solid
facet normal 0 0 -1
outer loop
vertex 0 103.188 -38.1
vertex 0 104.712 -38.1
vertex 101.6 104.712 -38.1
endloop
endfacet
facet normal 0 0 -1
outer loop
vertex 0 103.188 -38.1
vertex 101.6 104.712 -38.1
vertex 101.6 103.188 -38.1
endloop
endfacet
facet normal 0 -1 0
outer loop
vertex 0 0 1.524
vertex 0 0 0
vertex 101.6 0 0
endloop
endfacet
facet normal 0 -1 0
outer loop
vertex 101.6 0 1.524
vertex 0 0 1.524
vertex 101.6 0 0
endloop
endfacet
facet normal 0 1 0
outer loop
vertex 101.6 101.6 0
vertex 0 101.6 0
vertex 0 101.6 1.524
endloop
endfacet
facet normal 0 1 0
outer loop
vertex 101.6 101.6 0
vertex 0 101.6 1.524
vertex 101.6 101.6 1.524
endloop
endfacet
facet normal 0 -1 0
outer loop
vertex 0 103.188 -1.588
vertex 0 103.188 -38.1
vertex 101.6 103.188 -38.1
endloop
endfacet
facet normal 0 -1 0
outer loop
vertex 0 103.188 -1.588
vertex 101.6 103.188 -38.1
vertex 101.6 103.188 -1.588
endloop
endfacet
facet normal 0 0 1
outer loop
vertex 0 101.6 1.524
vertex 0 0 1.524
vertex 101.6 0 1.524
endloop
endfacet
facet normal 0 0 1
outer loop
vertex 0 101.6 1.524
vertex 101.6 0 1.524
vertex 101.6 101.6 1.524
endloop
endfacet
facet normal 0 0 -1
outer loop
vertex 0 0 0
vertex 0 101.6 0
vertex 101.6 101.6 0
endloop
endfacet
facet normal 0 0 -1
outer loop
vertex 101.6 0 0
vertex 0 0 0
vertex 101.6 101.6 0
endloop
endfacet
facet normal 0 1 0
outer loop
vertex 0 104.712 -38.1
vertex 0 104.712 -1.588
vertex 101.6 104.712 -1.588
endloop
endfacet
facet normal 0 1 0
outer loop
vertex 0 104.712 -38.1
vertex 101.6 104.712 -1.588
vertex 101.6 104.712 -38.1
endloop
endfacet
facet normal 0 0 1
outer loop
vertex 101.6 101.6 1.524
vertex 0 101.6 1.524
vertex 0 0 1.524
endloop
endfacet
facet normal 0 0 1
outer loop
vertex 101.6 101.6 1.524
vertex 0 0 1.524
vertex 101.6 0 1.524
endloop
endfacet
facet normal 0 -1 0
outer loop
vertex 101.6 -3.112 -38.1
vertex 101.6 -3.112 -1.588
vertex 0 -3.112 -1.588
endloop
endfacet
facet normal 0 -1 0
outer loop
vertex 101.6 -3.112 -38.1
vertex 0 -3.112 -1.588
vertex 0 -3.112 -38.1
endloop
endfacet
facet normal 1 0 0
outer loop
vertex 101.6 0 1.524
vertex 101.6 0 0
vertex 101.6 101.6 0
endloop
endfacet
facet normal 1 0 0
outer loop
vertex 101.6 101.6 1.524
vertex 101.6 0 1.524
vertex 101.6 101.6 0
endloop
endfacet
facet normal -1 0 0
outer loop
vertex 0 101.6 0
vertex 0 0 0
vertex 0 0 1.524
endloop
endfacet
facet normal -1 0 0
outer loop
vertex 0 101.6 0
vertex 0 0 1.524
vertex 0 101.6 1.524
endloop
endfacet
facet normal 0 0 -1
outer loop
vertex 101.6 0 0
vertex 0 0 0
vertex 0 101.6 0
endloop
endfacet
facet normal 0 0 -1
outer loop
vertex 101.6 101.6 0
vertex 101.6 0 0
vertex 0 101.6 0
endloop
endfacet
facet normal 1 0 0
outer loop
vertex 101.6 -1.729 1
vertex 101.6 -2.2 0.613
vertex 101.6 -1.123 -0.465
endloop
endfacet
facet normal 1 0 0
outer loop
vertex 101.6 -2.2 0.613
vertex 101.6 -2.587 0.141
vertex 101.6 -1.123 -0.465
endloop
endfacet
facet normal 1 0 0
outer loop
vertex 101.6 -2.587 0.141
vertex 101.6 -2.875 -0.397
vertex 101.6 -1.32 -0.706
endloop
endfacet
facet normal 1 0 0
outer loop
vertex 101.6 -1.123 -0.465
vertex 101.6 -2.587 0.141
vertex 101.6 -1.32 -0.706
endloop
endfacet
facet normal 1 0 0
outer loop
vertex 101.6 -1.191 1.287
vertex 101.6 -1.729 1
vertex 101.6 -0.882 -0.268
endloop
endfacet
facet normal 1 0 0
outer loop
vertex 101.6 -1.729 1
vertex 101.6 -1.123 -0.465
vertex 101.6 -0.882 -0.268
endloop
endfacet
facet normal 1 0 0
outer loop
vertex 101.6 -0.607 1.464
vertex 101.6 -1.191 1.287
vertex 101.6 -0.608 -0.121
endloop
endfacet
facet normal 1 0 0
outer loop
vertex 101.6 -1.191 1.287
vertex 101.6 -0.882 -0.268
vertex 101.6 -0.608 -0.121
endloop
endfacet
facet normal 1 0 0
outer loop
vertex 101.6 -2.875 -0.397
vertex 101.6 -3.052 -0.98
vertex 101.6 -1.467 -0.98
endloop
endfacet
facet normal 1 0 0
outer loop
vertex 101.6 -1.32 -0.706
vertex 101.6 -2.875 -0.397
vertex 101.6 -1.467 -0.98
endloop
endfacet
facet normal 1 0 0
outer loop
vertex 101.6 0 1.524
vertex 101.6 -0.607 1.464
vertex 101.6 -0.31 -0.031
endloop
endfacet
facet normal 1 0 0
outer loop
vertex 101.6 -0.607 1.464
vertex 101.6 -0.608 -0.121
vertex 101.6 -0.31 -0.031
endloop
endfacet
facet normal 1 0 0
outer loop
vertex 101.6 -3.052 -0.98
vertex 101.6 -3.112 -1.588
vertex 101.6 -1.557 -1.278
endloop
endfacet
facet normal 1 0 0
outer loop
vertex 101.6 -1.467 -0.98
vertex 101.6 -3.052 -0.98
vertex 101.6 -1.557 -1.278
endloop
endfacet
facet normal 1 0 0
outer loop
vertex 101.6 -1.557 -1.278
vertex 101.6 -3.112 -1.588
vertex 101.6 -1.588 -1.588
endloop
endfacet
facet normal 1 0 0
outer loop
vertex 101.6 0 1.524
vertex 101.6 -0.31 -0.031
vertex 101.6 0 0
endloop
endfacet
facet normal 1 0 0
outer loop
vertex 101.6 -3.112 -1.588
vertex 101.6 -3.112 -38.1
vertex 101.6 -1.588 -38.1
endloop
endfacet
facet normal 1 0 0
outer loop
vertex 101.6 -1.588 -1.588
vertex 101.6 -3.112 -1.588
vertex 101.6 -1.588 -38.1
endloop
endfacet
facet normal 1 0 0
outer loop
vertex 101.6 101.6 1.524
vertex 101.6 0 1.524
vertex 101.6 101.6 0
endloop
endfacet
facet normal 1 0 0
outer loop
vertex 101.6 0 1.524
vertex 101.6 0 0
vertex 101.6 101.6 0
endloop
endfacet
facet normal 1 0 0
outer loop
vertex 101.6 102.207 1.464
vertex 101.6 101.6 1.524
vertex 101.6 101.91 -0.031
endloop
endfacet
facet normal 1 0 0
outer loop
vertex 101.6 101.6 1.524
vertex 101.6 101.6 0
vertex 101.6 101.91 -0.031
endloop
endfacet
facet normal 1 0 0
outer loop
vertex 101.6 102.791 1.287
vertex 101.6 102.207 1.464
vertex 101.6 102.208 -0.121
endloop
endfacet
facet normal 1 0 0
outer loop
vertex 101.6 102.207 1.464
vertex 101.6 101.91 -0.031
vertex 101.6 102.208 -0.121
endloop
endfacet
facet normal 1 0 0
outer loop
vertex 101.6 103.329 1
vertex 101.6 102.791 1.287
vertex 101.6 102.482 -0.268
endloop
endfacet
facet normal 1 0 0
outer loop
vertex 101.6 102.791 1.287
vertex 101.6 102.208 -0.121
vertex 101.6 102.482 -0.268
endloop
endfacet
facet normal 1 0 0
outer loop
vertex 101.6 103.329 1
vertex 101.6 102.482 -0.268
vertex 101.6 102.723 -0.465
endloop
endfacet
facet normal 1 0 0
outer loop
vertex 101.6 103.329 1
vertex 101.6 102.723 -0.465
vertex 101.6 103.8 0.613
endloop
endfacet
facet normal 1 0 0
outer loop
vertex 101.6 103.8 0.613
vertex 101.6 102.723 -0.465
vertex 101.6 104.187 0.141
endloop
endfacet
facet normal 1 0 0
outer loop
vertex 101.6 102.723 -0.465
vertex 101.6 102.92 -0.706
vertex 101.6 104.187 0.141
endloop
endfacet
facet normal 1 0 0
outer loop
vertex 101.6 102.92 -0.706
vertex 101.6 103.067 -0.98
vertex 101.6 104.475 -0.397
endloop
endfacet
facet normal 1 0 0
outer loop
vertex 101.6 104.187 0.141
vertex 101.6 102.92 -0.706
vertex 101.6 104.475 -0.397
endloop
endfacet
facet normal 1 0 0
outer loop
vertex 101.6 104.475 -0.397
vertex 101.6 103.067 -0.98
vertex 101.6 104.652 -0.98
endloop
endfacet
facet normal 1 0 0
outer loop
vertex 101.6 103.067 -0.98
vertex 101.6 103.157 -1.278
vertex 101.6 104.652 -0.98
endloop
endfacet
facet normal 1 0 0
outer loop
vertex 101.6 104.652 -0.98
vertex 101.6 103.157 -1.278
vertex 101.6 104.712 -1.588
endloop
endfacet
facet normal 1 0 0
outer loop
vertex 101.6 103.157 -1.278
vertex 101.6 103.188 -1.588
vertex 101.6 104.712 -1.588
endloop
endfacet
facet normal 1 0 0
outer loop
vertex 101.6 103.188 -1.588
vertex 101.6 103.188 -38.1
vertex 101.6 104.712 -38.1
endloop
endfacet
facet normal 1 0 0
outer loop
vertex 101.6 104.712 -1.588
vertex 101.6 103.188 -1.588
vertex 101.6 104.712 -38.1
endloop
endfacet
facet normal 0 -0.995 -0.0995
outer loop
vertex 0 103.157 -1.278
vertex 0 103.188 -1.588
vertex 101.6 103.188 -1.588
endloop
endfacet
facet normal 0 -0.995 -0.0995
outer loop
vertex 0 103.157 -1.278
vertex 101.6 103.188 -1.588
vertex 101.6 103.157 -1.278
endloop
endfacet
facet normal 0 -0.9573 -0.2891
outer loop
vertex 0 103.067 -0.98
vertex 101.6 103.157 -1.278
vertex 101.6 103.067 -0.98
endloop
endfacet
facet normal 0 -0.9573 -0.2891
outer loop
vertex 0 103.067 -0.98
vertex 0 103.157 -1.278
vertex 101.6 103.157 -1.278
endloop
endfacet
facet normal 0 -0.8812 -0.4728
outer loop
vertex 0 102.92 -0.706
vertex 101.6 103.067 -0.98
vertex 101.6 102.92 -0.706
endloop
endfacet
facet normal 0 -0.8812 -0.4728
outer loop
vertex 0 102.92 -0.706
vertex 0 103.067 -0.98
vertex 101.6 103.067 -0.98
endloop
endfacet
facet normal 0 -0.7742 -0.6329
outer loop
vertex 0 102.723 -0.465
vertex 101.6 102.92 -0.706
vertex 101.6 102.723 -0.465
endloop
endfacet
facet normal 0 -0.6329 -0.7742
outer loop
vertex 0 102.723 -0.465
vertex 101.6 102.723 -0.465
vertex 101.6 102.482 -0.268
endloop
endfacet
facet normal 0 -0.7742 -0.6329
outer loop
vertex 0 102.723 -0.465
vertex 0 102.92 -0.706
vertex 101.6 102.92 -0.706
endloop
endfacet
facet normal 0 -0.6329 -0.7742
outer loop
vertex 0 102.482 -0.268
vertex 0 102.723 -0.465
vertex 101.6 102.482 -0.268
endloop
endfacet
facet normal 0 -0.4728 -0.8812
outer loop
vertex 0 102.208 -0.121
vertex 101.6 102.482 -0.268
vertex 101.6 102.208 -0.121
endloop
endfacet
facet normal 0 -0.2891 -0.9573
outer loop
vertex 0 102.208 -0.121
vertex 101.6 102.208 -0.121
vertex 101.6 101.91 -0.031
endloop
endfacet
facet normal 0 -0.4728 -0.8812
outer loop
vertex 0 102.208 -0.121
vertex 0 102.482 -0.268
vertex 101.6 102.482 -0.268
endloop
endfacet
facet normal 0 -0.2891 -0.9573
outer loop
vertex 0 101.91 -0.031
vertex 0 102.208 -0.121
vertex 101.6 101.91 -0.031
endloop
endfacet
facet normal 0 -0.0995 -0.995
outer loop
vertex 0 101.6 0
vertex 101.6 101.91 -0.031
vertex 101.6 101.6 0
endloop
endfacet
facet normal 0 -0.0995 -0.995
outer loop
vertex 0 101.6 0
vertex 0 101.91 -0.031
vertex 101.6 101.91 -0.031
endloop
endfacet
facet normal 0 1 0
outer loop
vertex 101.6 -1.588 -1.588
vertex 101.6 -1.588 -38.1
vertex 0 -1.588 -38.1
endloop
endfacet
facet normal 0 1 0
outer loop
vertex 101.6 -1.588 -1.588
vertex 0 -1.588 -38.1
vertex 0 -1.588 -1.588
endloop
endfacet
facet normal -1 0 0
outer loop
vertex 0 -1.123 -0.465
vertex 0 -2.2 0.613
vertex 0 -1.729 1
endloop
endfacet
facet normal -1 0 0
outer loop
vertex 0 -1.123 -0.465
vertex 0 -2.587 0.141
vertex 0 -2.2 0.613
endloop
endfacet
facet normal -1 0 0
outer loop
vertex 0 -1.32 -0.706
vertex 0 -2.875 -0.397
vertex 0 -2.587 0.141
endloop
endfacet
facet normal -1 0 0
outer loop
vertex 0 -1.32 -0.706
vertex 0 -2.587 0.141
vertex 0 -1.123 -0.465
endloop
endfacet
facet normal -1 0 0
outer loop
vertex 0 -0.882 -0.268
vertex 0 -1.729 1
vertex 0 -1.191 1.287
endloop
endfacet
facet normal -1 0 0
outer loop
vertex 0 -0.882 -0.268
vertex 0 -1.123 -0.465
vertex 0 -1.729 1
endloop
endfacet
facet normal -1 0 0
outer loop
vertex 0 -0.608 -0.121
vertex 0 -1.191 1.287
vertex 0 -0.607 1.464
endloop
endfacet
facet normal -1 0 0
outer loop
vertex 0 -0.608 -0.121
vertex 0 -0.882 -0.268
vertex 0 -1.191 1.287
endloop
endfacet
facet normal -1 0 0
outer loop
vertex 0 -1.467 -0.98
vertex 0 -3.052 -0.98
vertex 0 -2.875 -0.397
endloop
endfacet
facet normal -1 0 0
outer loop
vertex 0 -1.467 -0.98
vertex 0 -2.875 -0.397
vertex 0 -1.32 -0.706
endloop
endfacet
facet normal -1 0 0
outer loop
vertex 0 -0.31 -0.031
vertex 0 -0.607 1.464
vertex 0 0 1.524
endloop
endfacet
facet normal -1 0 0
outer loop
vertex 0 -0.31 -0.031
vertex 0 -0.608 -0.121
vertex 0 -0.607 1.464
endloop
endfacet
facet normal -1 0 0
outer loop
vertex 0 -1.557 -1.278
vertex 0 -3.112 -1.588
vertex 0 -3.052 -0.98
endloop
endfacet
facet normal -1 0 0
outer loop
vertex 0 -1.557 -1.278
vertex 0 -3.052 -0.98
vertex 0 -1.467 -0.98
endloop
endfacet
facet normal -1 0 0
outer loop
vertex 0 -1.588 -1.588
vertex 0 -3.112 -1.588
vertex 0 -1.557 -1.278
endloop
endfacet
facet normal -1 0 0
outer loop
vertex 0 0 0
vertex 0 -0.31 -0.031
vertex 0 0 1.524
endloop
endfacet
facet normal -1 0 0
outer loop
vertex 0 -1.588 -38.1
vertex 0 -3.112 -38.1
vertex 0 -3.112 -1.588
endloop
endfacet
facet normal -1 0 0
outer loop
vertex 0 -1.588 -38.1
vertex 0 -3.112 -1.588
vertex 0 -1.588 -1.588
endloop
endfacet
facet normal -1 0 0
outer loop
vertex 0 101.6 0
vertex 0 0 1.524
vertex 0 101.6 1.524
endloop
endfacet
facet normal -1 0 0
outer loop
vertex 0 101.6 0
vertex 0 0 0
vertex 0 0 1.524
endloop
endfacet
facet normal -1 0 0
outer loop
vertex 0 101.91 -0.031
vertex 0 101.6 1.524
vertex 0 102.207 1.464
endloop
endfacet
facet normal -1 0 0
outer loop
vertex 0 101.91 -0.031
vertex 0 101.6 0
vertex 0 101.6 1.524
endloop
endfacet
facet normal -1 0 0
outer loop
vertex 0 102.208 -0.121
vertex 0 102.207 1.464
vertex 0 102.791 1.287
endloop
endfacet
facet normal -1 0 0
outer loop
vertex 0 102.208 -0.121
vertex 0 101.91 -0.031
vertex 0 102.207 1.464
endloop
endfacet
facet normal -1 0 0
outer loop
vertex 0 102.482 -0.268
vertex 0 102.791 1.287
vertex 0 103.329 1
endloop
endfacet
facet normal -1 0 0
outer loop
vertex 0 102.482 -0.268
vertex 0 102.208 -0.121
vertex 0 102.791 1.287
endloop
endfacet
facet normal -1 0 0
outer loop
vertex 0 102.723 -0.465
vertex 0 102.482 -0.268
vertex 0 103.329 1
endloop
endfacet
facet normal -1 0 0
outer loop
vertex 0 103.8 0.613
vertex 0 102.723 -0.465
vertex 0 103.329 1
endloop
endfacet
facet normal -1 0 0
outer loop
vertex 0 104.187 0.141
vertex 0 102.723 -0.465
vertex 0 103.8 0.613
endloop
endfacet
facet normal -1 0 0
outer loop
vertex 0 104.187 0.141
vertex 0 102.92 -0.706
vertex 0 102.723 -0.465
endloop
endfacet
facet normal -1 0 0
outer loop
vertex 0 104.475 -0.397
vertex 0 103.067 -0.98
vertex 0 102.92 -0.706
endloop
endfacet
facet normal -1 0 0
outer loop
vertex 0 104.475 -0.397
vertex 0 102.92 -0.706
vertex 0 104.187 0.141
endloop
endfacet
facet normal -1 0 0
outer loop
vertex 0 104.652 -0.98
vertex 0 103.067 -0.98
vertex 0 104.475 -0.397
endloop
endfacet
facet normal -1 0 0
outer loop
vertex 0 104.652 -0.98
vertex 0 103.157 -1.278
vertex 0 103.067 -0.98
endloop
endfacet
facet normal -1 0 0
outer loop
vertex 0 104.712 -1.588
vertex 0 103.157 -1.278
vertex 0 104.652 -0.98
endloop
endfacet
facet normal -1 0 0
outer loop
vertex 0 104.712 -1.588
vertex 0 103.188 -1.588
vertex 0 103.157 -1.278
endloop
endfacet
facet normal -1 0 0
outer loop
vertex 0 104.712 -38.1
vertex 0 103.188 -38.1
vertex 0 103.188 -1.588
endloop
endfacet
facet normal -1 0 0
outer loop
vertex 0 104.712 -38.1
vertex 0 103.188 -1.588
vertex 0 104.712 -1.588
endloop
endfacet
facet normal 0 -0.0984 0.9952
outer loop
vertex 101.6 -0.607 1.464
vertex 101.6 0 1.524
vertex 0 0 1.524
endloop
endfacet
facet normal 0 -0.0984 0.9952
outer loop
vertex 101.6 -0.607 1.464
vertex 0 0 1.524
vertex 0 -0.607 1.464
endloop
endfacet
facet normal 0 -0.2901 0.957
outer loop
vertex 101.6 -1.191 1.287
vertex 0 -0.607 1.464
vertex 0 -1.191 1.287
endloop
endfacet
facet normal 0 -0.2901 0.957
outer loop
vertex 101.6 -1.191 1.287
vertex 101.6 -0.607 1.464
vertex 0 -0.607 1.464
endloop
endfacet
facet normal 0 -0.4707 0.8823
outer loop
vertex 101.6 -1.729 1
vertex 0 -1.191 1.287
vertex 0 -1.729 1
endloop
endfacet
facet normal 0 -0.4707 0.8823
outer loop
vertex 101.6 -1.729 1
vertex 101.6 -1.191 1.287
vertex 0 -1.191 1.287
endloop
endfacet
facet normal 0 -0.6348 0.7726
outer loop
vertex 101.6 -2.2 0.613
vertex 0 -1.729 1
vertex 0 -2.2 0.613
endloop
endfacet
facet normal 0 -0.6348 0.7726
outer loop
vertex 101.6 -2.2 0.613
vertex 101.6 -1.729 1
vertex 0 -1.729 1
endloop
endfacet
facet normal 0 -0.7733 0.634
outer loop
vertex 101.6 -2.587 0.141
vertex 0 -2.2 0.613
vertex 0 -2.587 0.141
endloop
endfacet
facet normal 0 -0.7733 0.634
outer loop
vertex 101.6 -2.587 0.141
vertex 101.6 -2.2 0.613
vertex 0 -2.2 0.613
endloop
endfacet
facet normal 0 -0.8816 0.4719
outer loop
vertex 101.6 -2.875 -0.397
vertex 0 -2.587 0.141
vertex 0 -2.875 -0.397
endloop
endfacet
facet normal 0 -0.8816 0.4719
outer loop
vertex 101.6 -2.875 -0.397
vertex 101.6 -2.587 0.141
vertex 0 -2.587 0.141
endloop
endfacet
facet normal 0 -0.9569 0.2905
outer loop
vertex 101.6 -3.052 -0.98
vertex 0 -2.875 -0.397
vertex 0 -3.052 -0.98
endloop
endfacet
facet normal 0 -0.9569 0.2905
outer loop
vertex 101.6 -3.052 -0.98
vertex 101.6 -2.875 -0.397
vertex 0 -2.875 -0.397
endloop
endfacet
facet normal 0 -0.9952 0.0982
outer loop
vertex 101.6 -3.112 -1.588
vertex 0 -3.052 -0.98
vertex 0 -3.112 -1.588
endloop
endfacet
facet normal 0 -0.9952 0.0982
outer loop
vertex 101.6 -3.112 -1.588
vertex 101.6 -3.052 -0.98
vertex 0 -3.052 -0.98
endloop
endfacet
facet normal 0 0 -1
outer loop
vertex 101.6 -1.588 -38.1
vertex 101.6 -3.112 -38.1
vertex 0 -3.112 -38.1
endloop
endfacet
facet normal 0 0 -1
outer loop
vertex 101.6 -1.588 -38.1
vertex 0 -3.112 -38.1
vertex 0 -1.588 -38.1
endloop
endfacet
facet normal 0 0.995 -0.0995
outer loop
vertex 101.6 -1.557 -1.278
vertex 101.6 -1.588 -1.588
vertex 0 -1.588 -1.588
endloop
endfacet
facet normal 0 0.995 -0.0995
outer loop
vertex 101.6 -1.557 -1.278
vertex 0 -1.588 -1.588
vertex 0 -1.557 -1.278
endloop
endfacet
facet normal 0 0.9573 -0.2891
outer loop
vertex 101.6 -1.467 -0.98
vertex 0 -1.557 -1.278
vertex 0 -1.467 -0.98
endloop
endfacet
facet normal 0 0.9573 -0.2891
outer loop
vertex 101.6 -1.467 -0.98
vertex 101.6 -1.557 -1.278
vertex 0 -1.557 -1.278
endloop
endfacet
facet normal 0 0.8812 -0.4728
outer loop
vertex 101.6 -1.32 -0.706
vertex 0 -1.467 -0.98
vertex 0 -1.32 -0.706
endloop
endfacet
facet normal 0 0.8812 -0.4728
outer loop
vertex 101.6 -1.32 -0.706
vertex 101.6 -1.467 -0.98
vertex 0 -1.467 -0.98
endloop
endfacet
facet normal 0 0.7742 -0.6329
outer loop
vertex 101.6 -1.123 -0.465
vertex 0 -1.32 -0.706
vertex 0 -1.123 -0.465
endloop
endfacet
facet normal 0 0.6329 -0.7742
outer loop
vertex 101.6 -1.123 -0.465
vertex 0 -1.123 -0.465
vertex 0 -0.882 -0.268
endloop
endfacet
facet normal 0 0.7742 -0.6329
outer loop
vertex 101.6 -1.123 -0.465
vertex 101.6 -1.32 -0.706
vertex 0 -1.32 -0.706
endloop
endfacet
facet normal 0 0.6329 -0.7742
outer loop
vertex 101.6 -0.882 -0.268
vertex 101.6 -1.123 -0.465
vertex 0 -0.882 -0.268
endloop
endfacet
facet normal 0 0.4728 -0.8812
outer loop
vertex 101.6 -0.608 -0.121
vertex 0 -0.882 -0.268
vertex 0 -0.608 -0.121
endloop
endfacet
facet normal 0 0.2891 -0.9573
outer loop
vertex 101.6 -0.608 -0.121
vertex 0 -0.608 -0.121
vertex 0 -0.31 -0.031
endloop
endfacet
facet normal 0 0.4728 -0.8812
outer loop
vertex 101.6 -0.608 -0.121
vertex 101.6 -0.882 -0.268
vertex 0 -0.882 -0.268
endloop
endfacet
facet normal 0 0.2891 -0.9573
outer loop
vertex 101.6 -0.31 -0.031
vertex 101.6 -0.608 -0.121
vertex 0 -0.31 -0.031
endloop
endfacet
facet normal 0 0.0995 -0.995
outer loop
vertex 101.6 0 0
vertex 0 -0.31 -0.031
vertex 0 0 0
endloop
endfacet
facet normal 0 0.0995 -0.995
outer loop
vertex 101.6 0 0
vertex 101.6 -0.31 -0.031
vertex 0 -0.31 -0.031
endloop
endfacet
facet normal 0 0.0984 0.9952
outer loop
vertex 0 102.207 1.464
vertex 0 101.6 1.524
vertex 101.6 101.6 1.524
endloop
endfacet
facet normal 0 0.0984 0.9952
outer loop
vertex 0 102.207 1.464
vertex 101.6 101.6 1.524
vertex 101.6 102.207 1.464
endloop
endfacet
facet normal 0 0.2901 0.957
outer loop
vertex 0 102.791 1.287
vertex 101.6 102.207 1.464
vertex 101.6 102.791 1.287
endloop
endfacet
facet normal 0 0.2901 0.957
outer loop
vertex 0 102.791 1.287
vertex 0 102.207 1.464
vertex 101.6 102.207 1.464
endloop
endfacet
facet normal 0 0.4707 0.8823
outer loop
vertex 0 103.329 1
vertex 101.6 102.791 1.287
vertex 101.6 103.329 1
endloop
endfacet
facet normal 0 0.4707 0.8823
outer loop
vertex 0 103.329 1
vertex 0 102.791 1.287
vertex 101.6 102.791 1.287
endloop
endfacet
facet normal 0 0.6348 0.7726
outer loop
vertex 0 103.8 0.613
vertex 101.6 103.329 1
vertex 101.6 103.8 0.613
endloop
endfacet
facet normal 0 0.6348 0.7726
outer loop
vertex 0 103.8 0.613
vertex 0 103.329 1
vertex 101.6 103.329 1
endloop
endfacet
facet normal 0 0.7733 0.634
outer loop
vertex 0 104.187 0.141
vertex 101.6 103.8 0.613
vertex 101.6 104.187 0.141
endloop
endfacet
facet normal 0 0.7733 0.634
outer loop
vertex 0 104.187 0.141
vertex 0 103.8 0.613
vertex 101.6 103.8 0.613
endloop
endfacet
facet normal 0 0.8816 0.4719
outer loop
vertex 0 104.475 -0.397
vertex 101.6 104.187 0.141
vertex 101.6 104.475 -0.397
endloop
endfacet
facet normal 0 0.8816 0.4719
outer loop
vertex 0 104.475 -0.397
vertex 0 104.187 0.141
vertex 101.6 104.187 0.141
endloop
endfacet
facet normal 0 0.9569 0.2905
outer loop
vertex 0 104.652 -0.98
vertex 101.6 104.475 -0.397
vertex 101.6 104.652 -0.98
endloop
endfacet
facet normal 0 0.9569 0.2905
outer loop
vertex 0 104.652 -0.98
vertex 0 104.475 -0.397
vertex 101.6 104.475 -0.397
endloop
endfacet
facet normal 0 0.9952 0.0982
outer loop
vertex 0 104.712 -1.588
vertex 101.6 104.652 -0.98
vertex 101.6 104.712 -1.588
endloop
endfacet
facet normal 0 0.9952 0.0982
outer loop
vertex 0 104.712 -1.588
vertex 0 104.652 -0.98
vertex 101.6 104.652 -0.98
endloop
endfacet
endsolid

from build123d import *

# Parameters (mm, degrees)
ESQUISSE1_W                 = 101.6
ESQUISSE1_H                 = 101.6
BOSS_EXTRU_1_DEPTH          = 1.524
CONVERTIR_VOLUME3_OUTLINE_W = 101.6
CONVERTIR_VOLUME3_OUTLINE_H = 1.524
CONVERTIR_VOLUME3_DEPTH     = 101.6
T_LE_PLI_E_SUR_AR_TE3_DEPTH = 101.6
T_LE_PLI_E_SUR_AR_TE5_DEPTH = 101.6


# Read off the part's stored shape, not the designer's step: Convertir-Volume3
# Sheet-metal steps are written as plain solids
with BuildPart() as part:
    # Esquisse1 → Boss.-Extru.1 (new body)
    with BuildSketch(Plane.XY):
        with Locations((50.8, 50.8)):
            Rectangle(ESQUISSE1_W, ESQUISSE1_H)
    extrude(amount=BOSS_EXTRU_1_DEPTH)


with BuildPart() as body_2:
    # Convertir-Volume3 outline → Convertir-Volume3 (new body)
    with BuildSketch(Plane.YZ):
        with Locations((50.8, 0.762)):
            Rectangle(CONVERTIR_VOLUME3_OUTLINE_W, CONVERTIR_VOLUME3_OUTLINE_H)
    extrude(amount=CONVERTIR_VOLUME3_DEPTH)

    # Tôle pliée sur arête3 section (across the edge) → Tôle pliée sur arête3 (add)
    with BuildSketch(Plane(origin=(101.6, -1.5875, 0), x_dir=(0, 1, 0), z_dir=(-1, 0, 0))):
        with BuildLine():
            Line((-1.524, 1.5875), (-1.524, 38.1))
            Line((-1.524, 38.1), (0, 38.1))
            Line((0, 38.1), (0, 1.5875))
            ThreePointArc((0, 1.5875), (0.464967985, 0.464967985), (1.5875, 0))
            Line((1.5875, 0), (1.5875, -1.524))
            ThreePointArc((1.5875, -1.524), (-0.61266275, -0.61266275), (-1.524, 1.5875))
        make_face()
    extrude(amount=T_LE_PLI_E_SUR_AR_TE3_DEPTH)

    # Tôle pliée sur arête5 section (across the edge) → Tôle pliée sur arête5 (add)
    with BuildSketch(Plane(origin=(0, 103.1875, 0), x_dir=(0, -1, 0), z_dir=(1, 0, 0))):
        with BuildLine():
            Line((-1.524, 1.5875), (-1.524, 38.1))
            Line((-1.524, 38.1), (0, 38.1))
            Line((0, 38.1), (0, 1.5875))
            ThreePointArc((0, 1.5875), (0.464967985, 0.464967985), (1.5875, 0))
            Line((1.5875, 0), (1.5875, -1.524))
            ThreePointArc((1.5875, -1.524), (-0.61266275, -0.61266275), (-1.524, 1.5875))
        make_face()
    extrude(amount=T_LE_PLI_E_SUR_AR_TE5_DEPTH)


solid = Compound([part.part, body_2.part])
